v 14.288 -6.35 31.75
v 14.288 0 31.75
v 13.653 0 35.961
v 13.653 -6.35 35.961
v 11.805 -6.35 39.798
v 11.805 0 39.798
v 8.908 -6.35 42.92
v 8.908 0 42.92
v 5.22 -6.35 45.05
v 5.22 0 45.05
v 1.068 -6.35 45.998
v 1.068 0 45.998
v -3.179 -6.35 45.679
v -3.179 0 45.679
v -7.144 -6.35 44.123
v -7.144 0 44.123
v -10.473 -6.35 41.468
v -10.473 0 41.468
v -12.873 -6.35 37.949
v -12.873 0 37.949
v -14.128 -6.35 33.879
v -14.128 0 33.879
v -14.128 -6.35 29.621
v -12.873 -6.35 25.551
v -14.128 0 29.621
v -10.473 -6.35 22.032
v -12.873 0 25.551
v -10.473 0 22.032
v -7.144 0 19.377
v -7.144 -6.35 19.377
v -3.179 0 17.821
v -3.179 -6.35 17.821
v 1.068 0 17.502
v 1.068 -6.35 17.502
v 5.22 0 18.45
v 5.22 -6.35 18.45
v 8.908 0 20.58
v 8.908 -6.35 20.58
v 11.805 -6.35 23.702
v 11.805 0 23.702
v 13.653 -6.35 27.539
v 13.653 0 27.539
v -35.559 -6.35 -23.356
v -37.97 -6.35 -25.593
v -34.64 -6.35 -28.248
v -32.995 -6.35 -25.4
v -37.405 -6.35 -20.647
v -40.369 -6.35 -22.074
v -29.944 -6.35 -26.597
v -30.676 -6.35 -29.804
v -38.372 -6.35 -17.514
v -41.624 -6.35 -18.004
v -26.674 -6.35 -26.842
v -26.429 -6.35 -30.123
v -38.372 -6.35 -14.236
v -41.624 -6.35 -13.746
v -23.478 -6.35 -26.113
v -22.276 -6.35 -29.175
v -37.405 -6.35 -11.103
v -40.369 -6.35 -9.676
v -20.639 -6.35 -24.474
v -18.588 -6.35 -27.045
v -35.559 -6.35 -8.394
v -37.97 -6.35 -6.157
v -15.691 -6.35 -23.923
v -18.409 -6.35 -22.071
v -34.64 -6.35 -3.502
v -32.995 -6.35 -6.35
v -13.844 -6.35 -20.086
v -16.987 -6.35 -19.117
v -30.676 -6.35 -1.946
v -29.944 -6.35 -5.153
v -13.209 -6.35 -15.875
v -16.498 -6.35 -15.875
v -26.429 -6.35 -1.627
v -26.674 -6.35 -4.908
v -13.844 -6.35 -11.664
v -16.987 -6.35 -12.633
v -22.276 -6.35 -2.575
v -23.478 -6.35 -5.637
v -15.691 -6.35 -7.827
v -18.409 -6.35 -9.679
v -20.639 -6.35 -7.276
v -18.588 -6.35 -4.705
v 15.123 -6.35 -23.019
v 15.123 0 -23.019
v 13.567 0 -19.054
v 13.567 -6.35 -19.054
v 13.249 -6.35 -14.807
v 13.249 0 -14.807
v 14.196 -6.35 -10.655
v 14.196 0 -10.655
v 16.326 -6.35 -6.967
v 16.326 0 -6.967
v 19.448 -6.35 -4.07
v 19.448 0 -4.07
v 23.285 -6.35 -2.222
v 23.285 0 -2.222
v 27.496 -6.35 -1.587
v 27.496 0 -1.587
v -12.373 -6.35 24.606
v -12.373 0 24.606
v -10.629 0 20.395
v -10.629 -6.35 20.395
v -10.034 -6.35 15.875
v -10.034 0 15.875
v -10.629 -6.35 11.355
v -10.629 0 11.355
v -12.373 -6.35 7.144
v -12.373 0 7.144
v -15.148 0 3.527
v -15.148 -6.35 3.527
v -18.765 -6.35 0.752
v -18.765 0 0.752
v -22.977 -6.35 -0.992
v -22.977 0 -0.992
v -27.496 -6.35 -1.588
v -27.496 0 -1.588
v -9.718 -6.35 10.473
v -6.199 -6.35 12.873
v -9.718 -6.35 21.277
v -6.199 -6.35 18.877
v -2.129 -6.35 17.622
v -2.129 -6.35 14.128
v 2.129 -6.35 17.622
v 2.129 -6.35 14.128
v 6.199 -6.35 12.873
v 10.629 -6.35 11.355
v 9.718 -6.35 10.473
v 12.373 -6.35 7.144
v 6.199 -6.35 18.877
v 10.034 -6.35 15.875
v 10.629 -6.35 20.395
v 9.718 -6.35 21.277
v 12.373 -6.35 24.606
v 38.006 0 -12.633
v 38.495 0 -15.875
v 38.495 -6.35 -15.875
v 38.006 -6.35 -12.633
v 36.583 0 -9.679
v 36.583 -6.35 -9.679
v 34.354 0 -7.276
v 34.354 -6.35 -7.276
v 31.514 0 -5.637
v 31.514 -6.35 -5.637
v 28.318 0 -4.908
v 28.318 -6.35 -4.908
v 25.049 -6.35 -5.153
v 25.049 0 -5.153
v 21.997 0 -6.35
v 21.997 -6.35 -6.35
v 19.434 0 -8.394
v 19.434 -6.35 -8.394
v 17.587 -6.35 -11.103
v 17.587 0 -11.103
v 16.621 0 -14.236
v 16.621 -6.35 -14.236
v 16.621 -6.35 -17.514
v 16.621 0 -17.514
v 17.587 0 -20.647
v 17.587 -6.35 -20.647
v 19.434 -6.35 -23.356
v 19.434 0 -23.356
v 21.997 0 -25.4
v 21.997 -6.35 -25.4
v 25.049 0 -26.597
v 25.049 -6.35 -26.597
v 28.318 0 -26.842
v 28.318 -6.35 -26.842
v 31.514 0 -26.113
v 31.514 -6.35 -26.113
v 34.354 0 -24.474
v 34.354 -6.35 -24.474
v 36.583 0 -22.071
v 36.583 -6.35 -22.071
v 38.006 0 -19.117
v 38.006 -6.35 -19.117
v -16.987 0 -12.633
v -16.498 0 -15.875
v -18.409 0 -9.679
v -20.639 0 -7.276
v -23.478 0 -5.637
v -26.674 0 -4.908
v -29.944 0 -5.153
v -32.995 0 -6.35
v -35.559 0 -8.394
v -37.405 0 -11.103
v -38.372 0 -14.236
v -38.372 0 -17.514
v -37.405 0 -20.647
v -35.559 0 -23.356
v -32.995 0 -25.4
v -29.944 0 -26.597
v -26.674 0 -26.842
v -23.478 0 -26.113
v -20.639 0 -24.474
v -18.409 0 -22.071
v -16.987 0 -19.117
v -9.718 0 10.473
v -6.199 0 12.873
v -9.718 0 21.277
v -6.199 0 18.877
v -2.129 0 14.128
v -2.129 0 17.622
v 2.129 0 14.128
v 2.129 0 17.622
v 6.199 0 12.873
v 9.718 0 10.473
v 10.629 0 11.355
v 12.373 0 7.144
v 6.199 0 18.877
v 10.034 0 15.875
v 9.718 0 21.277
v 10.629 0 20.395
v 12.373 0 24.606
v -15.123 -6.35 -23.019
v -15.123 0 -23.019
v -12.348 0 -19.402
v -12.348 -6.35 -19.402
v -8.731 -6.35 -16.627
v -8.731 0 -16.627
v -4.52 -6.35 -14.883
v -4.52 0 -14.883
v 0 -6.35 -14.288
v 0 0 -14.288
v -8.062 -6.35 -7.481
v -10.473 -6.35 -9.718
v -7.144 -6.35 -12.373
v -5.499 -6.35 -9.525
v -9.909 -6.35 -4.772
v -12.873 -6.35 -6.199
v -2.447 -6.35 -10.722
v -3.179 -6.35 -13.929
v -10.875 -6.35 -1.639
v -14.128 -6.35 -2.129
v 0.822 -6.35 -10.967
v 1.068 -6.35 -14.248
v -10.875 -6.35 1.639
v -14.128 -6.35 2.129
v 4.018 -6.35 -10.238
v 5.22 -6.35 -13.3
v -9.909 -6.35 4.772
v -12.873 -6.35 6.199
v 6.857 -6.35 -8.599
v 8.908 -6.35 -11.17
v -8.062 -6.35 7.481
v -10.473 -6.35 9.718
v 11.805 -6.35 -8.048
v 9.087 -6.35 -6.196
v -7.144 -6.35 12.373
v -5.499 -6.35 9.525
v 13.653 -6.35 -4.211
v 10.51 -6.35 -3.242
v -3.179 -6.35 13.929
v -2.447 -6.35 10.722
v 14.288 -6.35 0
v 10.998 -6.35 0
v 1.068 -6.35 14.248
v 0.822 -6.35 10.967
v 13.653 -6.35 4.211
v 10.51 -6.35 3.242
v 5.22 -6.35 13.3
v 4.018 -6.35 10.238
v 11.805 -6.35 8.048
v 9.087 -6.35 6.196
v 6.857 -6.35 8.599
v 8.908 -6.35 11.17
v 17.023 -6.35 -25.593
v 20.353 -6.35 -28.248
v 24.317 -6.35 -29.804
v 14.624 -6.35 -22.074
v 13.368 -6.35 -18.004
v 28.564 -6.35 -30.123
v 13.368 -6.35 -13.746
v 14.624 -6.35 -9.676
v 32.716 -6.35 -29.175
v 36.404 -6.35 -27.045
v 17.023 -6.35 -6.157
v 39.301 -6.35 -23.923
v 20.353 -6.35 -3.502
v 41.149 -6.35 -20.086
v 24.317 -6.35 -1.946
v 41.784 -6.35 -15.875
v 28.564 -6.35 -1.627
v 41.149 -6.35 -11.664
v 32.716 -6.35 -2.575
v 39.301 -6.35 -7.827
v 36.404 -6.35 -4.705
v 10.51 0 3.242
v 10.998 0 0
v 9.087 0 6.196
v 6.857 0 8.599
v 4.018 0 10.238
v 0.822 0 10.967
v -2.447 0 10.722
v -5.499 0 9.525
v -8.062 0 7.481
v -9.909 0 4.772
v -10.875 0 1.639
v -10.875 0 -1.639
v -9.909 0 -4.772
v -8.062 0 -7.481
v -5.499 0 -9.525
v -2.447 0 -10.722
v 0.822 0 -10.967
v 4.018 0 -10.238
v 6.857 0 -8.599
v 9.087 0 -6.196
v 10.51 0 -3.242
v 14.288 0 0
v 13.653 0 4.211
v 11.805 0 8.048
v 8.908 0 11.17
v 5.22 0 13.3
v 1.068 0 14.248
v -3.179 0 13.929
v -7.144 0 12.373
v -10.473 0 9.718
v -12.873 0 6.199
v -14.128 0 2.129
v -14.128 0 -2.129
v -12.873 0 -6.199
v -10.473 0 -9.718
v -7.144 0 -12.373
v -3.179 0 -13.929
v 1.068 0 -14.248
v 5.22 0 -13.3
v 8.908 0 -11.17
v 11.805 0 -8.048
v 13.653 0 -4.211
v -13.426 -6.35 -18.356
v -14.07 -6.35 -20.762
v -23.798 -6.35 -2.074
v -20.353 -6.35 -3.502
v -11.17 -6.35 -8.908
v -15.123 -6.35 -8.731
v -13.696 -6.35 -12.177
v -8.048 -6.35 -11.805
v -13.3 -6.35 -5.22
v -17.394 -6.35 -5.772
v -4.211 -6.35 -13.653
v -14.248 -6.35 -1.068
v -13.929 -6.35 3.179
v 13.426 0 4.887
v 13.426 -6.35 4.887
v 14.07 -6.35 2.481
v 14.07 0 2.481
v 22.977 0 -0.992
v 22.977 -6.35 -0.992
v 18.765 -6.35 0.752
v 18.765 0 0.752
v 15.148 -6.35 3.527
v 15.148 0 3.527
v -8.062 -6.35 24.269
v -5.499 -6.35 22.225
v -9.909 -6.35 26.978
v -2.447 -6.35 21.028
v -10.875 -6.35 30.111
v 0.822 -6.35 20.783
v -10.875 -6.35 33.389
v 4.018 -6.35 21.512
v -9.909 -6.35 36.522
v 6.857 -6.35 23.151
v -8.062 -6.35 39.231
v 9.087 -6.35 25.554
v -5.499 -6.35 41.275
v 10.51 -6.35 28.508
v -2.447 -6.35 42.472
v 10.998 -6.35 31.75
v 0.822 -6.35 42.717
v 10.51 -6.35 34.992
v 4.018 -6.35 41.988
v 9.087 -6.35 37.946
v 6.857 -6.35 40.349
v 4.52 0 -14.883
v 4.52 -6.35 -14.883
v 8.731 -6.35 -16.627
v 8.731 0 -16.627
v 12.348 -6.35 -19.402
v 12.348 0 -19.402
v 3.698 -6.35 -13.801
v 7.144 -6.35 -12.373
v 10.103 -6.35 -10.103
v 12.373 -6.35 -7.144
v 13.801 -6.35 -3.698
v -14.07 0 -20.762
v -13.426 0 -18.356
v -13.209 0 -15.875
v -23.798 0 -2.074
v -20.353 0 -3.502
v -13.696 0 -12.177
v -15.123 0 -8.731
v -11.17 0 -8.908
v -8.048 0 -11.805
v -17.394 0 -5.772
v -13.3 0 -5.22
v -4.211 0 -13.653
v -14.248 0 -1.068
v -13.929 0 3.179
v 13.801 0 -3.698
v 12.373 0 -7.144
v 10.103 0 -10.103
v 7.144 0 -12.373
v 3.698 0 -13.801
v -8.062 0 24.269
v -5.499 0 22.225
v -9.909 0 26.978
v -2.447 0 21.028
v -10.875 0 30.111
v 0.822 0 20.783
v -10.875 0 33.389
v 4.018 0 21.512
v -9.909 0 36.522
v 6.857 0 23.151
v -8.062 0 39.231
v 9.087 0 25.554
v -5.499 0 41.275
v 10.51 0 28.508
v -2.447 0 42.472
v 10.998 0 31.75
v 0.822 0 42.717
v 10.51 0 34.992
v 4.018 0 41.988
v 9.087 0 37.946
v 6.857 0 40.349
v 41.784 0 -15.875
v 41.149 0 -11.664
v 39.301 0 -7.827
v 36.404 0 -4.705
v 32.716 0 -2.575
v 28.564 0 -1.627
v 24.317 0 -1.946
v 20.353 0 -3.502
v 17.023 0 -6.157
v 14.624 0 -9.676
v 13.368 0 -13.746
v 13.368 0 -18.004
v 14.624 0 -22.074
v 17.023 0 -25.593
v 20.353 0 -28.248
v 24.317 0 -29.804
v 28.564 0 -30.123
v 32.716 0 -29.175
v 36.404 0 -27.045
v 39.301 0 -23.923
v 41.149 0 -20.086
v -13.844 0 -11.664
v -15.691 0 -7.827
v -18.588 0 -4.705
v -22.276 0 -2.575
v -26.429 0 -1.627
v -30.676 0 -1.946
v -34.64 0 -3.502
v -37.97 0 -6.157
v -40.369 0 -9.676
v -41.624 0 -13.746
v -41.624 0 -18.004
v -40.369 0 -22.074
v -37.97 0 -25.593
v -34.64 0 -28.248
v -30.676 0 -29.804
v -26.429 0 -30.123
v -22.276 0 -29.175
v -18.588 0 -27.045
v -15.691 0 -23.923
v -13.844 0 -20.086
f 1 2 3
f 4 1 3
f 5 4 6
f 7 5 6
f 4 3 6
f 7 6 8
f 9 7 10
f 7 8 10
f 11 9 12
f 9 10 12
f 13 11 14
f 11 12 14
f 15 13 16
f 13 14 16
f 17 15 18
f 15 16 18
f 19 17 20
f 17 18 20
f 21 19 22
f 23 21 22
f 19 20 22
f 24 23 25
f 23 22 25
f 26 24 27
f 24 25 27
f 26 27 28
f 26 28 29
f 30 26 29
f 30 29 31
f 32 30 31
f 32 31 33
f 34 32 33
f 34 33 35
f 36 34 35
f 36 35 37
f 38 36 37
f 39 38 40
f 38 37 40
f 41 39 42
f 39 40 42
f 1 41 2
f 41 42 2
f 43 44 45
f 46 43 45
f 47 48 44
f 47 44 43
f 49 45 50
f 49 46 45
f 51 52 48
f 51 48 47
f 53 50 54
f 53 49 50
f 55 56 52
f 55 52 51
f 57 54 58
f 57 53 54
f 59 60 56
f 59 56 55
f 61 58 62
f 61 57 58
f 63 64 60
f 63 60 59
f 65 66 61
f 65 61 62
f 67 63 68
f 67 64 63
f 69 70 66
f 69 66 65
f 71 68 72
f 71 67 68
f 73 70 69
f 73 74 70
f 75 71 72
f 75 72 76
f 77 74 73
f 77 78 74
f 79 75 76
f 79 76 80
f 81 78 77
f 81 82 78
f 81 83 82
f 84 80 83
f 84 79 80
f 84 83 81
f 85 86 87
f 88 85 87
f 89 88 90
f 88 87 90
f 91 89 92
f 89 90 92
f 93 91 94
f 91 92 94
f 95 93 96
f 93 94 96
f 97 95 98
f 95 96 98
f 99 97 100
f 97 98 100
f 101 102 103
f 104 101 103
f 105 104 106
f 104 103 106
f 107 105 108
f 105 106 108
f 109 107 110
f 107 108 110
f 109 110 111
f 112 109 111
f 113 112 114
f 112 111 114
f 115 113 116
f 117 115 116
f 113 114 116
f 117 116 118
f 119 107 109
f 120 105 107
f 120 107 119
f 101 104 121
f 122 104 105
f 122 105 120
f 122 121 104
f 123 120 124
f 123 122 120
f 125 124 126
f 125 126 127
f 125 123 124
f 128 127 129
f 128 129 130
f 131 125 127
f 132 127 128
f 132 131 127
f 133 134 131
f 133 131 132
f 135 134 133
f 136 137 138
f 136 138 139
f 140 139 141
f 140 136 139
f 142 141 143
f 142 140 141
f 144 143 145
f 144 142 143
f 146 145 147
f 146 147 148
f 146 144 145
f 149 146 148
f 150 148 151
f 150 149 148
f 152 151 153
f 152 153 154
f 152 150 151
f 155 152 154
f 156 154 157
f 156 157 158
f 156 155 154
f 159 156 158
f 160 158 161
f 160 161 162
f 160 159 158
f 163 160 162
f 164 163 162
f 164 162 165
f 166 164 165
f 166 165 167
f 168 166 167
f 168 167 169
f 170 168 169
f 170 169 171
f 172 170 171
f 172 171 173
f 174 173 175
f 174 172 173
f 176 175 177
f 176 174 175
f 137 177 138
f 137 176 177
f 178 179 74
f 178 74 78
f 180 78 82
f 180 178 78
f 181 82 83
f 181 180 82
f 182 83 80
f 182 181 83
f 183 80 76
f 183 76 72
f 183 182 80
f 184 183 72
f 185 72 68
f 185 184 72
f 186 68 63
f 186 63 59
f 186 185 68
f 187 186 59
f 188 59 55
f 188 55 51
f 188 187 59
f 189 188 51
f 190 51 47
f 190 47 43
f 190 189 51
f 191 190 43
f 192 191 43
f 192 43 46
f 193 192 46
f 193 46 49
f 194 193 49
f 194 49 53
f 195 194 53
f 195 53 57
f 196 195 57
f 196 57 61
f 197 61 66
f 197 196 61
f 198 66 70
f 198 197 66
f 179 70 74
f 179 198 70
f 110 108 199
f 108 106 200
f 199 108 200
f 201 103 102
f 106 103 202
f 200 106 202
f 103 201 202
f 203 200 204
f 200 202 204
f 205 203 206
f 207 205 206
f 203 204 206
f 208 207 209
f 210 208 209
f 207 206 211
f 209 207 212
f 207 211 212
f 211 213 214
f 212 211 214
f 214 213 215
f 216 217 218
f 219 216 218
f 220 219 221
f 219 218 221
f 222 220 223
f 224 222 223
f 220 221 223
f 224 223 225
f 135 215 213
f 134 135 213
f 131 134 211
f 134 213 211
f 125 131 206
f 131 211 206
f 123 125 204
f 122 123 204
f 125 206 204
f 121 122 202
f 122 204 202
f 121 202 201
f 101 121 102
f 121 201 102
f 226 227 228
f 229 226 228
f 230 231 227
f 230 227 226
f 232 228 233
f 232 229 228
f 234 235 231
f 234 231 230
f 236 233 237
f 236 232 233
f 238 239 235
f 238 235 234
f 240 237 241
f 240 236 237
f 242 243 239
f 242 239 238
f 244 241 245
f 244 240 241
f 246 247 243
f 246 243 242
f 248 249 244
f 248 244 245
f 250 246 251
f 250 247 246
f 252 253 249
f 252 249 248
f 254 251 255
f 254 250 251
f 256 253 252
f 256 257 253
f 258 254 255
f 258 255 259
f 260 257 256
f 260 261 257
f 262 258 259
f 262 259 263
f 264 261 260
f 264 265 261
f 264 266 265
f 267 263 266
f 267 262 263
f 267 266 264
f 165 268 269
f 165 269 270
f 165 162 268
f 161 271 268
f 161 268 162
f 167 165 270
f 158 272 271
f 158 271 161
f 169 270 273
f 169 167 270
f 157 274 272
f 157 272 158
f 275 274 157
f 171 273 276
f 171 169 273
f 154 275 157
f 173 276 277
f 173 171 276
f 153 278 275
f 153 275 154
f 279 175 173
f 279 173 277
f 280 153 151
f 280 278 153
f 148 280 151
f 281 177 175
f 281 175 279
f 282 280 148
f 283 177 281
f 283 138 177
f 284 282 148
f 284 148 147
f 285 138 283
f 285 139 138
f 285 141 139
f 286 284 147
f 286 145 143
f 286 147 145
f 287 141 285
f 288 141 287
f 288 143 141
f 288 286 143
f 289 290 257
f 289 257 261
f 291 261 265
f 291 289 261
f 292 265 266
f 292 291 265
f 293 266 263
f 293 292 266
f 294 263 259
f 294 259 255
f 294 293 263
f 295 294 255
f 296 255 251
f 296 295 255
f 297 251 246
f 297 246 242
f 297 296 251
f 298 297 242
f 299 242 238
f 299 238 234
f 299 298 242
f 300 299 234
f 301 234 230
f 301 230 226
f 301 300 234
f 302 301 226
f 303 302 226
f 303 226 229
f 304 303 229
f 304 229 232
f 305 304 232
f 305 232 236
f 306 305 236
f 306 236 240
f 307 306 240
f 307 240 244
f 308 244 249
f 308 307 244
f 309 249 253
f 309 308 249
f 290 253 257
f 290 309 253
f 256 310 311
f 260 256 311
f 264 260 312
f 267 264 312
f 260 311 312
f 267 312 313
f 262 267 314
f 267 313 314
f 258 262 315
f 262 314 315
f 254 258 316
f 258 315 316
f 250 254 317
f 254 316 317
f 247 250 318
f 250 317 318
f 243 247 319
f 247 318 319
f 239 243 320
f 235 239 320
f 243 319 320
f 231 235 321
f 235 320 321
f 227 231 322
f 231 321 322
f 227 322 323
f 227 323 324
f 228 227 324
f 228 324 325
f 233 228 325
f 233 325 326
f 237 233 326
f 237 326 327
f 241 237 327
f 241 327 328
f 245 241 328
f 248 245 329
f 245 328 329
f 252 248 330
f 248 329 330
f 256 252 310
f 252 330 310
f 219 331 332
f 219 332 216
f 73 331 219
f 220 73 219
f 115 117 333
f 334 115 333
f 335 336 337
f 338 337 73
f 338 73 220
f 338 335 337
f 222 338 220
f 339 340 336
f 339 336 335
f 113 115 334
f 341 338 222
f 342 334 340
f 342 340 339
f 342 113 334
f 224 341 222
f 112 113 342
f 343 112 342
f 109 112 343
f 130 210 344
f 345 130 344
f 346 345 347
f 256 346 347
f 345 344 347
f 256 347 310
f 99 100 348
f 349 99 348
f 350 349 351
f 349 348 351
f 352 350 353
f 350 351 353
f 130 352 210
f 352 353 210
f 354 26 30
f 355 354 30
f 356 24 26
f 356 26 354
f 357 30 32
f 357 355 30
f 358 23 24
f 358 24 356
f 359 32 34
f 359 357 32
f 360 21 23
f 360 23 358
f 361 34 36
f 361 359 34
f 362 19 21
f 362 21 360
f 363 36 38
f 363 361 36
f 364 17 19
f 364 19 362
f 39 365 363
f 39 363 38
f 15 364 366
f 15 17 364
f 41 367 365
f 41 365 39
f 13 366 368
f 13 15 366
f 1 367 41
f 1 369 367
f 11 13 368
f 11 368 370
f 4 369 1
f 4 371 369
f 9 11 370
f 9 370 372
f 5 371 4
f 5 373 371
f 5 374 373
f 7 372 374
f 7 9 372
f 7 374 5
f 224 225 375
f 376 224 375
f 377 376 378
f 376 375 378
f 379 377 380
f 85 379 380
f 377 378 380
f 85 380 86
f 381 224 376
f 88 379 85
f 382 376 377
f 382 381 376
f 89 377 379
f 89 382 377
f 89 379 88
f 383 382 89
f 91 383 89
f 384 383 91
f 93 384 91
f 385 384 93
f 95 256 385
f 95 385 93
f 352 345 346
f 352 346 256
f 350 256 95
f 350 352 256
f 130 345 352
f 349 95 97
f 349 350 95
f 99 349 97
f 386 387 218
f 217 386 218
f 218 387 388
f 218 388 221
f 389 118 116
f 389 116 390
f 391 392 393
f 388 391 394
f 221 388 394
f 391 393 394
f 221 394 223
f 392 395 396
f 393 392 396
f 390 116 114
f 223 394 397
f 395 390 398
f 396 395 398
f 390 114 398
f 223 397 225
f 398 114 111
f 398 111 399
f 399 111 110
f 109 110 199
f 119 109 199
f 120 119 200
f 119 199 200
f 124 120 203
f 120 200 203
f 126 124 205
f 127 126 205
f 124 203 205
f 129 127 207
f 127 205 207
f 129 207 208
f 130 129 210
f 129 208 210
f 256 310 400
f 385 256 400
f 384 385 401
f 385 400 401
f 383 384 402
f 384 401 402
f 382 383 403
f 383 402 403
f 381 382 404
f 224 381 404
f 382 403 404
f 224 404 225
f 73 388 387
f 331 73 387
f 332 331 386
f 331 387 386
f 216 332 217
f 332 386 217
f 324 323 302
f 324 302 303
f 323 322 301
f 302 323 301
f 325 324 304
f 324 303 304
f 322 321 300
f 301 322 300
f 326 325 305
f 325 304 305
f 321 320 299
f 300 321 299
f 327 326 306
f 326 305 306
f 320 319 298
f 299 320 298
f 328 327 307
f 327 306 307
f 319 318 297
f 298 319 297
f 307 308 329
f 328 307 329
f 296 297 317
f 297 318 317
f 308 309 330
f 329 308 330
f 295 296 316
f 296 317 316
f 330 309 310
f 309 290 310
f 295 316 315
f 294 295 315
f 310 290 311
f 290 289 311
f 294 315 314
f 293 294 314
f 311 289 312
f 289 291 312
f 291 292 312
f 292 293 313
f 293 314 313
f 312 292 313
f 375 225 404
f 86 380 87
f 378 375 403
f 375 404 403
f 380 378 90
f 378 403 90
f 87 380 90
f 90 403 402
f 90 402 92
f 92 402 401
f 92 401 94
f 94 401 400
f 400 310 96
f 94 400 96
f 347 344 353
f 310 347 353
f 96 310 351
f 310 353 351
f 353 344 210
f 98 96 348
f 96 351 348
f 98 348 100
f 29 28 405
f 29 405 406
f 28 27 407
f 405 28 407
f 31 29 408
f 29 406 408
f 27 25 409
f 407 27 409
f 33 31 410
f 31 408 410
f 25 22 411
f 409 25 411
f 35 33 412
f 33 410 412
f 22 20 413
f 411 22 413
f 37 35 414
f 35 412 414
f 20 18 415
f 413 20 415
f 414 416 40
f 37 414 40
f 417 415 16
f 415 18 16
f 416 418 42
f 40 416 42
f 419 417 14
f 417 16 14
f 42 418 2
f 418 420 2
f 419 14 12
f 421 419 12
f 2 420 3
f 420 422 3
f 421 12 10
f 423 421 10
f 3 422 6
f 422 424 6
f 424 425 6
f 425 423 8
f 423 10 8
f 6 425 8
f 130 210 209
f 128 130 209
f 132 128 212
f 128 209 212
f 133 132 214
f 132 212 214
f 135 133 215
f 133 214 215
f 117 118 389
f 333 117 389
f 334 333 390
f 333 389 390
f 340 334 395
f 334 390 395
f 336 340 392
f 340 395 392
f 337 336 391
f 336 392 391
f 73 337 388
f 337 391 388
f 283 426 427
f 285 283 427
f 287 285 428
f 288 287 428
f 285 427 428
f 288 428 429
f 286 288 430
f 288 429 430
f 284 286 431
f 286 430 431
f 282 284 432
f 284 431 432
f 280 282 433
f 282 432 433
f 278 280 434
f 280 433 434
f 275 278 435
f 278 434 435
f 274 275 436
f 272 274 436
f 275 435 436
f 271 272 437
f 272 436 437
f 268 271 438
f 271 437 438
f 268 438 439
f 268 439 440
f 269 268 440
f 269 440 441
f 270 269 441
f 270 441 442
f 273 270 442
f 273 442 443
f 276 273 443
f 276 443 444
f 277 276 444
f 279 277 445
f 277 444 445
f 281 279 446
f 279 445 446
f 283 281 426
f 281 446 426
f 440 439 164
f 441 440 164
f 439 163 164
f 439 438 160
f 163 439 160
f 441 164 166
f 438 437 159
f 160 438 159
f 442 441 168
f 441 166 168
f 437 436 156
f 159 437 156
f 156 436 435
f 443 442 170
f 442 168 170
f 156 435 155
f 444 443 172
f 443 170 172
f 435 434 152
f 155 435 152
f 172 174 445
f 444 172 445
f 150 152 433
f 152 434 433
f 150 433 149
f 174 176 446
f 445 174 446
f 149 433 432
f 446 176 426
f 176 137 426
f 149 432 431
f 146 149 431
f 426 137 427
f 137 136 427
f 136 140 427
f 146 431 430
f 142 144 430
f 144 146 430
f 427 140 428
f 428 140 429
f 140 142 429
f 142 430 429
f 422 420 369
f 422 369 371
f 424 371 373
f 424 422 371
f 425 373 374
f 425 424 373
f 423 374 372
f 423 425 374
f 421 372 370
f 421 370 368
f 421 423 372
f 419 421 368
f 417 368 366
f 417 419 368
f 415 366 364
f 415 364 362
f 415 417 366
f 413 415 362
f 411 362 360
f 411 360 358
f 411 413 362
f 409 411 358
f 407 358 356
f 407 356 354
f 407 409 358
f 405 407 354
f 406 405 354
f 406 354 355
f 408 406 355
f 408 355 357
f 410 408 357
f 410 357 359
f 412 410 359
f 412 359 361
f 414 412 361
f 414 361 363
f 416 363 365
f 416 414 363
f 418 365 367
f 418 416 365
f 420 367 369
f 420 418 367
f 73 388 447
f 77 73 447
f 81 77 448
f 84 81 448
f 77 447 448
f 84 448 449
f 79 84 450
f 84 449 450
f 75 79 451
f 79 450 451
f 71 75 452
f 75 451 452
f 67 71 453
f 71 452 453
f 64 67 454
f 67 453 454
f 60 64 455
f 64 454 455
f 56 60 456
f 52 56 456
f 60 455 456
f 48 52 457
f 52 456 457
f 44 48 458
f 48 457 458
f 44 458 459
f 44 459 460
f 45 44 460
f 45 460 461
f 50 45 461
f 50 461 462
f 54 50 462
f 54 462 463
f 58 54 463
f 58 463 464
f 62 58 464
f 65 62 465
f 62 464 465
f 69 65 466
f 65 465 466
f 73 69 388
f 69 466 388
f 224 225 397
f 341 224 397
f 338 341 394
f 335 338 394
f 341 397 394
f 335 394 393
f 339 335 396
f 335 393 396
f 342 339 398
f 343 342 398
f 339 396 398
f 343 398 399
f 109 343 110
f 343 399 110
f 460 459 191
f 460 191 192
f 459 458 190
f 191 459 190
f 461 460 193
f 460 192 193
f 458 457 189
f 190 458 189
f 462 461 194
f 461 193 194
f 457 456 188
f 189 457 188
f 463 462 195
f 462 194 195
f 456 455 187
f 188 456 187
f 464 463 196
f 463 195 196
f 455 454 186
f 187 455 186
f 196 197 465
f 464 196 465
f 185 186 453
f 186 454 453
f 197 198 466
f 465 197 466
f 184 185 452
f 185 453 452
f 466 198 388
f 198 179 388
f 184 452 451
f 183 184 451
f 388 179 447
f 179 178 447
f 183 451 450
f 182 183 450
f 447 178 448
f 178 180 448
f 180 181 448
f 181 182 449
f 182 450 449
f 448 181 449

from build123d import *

# Parameters (mm, degrees)
F2_DEPTH = 6.35
F0_R     = 14.2875
F0_R_2   = 10.9982
F3_DEPTH = 6.35


with BuildPart() as f2:
    # F1 (on Front) → F2 (new body)
    with BuildSketch(Plane.XZ):
        with BuildLine():
            ThreePointArc((12.373338, 24.60625), (0, 17.4625), (-12.373338, 24.60625))
            ThreePointArc((-12.373338, 24.60625), (-10.033807, 15.875), (-12.373338, 7.14375))
            ThreePointArc((-12.373338, 7.14375), (0, 14.2875), (12.373338, 7.14375))
            ThreePointArc((12.373338, 7.14375), (10.033807, 15.875), (12.373338, 24.60625))
        make_face()
        with BuildLine():
            ThreePointArc((27.496307, -1.5875), (18.765057, 0.752031), (12.373338, 7.14375))
            ThreePointArc((12.373338, 7.14375), (13.800665, 3.697877), (14.2875, 0))
            ThreePointArc((14.2875, 0), (10.102788, -10.102788), (0, -14.2875))
            ThreePointArc((0, -14.2875), (8.73125, -16.627031), (15.122969, -23.01875))
            ThreePointArc((15.122969, -23.01875), (15.122969, -8.73125), (27.496307, -1.5875))
        make_face()
        with BuildLine():
            ThreePointArc((0, -14.2875), (-12.373338, -7.14375), (-12.373338, 7.14375))
            ThreePointArc((-12.373338, 7.14375), (-18.765057, 0.752031), (-27.496307, -1.5875))
            ThreePointArc((-27.496307, -1.5875), (-17.393518, -5.772212), (-13.208807, -15.875))
            ThreePointArc((-13.208807, -15.875), (-13.695641, -19.572877), (-15.122969, -23.01875))
            ThreePointArc((-15.122969, -23.01875), (-8.73125, -16.627031), (0, -14.2875))
        make_face()
    extrude(amount=F2_DEPTH)


with BuildPart() as f3:
    # F0 (on Front) → F3 (new body)
    with BuildSketch(Plane.XZ):
        Circle(F0_R)
        Circle(F0_R_2, mode=Mode.SUBTRACT)
        with Locations((0, 31.75)):
            Circle(F0_R)
        with Locations((0, 31.75)):
            Circle(F0_R_2, mode=Mode.SUBTRACT)
        with Locations((-27.496307, -15.875)):
            Circle(F0_R)
        with Locations((-27.496307, -15.875)):
            Circle(F0_R_2, mode=Mode.SUBTRACT)
        with Locations((27.496307, -15.875)):
            Circle(F0_R)
        with Locations((27.496307, -15.875)):
            Circle(F0_R_2, mode=Mode.SUBTRACT)
    extrude(amount=F3_DEPTH)


solid = Compound([f2.part, f3.part])
